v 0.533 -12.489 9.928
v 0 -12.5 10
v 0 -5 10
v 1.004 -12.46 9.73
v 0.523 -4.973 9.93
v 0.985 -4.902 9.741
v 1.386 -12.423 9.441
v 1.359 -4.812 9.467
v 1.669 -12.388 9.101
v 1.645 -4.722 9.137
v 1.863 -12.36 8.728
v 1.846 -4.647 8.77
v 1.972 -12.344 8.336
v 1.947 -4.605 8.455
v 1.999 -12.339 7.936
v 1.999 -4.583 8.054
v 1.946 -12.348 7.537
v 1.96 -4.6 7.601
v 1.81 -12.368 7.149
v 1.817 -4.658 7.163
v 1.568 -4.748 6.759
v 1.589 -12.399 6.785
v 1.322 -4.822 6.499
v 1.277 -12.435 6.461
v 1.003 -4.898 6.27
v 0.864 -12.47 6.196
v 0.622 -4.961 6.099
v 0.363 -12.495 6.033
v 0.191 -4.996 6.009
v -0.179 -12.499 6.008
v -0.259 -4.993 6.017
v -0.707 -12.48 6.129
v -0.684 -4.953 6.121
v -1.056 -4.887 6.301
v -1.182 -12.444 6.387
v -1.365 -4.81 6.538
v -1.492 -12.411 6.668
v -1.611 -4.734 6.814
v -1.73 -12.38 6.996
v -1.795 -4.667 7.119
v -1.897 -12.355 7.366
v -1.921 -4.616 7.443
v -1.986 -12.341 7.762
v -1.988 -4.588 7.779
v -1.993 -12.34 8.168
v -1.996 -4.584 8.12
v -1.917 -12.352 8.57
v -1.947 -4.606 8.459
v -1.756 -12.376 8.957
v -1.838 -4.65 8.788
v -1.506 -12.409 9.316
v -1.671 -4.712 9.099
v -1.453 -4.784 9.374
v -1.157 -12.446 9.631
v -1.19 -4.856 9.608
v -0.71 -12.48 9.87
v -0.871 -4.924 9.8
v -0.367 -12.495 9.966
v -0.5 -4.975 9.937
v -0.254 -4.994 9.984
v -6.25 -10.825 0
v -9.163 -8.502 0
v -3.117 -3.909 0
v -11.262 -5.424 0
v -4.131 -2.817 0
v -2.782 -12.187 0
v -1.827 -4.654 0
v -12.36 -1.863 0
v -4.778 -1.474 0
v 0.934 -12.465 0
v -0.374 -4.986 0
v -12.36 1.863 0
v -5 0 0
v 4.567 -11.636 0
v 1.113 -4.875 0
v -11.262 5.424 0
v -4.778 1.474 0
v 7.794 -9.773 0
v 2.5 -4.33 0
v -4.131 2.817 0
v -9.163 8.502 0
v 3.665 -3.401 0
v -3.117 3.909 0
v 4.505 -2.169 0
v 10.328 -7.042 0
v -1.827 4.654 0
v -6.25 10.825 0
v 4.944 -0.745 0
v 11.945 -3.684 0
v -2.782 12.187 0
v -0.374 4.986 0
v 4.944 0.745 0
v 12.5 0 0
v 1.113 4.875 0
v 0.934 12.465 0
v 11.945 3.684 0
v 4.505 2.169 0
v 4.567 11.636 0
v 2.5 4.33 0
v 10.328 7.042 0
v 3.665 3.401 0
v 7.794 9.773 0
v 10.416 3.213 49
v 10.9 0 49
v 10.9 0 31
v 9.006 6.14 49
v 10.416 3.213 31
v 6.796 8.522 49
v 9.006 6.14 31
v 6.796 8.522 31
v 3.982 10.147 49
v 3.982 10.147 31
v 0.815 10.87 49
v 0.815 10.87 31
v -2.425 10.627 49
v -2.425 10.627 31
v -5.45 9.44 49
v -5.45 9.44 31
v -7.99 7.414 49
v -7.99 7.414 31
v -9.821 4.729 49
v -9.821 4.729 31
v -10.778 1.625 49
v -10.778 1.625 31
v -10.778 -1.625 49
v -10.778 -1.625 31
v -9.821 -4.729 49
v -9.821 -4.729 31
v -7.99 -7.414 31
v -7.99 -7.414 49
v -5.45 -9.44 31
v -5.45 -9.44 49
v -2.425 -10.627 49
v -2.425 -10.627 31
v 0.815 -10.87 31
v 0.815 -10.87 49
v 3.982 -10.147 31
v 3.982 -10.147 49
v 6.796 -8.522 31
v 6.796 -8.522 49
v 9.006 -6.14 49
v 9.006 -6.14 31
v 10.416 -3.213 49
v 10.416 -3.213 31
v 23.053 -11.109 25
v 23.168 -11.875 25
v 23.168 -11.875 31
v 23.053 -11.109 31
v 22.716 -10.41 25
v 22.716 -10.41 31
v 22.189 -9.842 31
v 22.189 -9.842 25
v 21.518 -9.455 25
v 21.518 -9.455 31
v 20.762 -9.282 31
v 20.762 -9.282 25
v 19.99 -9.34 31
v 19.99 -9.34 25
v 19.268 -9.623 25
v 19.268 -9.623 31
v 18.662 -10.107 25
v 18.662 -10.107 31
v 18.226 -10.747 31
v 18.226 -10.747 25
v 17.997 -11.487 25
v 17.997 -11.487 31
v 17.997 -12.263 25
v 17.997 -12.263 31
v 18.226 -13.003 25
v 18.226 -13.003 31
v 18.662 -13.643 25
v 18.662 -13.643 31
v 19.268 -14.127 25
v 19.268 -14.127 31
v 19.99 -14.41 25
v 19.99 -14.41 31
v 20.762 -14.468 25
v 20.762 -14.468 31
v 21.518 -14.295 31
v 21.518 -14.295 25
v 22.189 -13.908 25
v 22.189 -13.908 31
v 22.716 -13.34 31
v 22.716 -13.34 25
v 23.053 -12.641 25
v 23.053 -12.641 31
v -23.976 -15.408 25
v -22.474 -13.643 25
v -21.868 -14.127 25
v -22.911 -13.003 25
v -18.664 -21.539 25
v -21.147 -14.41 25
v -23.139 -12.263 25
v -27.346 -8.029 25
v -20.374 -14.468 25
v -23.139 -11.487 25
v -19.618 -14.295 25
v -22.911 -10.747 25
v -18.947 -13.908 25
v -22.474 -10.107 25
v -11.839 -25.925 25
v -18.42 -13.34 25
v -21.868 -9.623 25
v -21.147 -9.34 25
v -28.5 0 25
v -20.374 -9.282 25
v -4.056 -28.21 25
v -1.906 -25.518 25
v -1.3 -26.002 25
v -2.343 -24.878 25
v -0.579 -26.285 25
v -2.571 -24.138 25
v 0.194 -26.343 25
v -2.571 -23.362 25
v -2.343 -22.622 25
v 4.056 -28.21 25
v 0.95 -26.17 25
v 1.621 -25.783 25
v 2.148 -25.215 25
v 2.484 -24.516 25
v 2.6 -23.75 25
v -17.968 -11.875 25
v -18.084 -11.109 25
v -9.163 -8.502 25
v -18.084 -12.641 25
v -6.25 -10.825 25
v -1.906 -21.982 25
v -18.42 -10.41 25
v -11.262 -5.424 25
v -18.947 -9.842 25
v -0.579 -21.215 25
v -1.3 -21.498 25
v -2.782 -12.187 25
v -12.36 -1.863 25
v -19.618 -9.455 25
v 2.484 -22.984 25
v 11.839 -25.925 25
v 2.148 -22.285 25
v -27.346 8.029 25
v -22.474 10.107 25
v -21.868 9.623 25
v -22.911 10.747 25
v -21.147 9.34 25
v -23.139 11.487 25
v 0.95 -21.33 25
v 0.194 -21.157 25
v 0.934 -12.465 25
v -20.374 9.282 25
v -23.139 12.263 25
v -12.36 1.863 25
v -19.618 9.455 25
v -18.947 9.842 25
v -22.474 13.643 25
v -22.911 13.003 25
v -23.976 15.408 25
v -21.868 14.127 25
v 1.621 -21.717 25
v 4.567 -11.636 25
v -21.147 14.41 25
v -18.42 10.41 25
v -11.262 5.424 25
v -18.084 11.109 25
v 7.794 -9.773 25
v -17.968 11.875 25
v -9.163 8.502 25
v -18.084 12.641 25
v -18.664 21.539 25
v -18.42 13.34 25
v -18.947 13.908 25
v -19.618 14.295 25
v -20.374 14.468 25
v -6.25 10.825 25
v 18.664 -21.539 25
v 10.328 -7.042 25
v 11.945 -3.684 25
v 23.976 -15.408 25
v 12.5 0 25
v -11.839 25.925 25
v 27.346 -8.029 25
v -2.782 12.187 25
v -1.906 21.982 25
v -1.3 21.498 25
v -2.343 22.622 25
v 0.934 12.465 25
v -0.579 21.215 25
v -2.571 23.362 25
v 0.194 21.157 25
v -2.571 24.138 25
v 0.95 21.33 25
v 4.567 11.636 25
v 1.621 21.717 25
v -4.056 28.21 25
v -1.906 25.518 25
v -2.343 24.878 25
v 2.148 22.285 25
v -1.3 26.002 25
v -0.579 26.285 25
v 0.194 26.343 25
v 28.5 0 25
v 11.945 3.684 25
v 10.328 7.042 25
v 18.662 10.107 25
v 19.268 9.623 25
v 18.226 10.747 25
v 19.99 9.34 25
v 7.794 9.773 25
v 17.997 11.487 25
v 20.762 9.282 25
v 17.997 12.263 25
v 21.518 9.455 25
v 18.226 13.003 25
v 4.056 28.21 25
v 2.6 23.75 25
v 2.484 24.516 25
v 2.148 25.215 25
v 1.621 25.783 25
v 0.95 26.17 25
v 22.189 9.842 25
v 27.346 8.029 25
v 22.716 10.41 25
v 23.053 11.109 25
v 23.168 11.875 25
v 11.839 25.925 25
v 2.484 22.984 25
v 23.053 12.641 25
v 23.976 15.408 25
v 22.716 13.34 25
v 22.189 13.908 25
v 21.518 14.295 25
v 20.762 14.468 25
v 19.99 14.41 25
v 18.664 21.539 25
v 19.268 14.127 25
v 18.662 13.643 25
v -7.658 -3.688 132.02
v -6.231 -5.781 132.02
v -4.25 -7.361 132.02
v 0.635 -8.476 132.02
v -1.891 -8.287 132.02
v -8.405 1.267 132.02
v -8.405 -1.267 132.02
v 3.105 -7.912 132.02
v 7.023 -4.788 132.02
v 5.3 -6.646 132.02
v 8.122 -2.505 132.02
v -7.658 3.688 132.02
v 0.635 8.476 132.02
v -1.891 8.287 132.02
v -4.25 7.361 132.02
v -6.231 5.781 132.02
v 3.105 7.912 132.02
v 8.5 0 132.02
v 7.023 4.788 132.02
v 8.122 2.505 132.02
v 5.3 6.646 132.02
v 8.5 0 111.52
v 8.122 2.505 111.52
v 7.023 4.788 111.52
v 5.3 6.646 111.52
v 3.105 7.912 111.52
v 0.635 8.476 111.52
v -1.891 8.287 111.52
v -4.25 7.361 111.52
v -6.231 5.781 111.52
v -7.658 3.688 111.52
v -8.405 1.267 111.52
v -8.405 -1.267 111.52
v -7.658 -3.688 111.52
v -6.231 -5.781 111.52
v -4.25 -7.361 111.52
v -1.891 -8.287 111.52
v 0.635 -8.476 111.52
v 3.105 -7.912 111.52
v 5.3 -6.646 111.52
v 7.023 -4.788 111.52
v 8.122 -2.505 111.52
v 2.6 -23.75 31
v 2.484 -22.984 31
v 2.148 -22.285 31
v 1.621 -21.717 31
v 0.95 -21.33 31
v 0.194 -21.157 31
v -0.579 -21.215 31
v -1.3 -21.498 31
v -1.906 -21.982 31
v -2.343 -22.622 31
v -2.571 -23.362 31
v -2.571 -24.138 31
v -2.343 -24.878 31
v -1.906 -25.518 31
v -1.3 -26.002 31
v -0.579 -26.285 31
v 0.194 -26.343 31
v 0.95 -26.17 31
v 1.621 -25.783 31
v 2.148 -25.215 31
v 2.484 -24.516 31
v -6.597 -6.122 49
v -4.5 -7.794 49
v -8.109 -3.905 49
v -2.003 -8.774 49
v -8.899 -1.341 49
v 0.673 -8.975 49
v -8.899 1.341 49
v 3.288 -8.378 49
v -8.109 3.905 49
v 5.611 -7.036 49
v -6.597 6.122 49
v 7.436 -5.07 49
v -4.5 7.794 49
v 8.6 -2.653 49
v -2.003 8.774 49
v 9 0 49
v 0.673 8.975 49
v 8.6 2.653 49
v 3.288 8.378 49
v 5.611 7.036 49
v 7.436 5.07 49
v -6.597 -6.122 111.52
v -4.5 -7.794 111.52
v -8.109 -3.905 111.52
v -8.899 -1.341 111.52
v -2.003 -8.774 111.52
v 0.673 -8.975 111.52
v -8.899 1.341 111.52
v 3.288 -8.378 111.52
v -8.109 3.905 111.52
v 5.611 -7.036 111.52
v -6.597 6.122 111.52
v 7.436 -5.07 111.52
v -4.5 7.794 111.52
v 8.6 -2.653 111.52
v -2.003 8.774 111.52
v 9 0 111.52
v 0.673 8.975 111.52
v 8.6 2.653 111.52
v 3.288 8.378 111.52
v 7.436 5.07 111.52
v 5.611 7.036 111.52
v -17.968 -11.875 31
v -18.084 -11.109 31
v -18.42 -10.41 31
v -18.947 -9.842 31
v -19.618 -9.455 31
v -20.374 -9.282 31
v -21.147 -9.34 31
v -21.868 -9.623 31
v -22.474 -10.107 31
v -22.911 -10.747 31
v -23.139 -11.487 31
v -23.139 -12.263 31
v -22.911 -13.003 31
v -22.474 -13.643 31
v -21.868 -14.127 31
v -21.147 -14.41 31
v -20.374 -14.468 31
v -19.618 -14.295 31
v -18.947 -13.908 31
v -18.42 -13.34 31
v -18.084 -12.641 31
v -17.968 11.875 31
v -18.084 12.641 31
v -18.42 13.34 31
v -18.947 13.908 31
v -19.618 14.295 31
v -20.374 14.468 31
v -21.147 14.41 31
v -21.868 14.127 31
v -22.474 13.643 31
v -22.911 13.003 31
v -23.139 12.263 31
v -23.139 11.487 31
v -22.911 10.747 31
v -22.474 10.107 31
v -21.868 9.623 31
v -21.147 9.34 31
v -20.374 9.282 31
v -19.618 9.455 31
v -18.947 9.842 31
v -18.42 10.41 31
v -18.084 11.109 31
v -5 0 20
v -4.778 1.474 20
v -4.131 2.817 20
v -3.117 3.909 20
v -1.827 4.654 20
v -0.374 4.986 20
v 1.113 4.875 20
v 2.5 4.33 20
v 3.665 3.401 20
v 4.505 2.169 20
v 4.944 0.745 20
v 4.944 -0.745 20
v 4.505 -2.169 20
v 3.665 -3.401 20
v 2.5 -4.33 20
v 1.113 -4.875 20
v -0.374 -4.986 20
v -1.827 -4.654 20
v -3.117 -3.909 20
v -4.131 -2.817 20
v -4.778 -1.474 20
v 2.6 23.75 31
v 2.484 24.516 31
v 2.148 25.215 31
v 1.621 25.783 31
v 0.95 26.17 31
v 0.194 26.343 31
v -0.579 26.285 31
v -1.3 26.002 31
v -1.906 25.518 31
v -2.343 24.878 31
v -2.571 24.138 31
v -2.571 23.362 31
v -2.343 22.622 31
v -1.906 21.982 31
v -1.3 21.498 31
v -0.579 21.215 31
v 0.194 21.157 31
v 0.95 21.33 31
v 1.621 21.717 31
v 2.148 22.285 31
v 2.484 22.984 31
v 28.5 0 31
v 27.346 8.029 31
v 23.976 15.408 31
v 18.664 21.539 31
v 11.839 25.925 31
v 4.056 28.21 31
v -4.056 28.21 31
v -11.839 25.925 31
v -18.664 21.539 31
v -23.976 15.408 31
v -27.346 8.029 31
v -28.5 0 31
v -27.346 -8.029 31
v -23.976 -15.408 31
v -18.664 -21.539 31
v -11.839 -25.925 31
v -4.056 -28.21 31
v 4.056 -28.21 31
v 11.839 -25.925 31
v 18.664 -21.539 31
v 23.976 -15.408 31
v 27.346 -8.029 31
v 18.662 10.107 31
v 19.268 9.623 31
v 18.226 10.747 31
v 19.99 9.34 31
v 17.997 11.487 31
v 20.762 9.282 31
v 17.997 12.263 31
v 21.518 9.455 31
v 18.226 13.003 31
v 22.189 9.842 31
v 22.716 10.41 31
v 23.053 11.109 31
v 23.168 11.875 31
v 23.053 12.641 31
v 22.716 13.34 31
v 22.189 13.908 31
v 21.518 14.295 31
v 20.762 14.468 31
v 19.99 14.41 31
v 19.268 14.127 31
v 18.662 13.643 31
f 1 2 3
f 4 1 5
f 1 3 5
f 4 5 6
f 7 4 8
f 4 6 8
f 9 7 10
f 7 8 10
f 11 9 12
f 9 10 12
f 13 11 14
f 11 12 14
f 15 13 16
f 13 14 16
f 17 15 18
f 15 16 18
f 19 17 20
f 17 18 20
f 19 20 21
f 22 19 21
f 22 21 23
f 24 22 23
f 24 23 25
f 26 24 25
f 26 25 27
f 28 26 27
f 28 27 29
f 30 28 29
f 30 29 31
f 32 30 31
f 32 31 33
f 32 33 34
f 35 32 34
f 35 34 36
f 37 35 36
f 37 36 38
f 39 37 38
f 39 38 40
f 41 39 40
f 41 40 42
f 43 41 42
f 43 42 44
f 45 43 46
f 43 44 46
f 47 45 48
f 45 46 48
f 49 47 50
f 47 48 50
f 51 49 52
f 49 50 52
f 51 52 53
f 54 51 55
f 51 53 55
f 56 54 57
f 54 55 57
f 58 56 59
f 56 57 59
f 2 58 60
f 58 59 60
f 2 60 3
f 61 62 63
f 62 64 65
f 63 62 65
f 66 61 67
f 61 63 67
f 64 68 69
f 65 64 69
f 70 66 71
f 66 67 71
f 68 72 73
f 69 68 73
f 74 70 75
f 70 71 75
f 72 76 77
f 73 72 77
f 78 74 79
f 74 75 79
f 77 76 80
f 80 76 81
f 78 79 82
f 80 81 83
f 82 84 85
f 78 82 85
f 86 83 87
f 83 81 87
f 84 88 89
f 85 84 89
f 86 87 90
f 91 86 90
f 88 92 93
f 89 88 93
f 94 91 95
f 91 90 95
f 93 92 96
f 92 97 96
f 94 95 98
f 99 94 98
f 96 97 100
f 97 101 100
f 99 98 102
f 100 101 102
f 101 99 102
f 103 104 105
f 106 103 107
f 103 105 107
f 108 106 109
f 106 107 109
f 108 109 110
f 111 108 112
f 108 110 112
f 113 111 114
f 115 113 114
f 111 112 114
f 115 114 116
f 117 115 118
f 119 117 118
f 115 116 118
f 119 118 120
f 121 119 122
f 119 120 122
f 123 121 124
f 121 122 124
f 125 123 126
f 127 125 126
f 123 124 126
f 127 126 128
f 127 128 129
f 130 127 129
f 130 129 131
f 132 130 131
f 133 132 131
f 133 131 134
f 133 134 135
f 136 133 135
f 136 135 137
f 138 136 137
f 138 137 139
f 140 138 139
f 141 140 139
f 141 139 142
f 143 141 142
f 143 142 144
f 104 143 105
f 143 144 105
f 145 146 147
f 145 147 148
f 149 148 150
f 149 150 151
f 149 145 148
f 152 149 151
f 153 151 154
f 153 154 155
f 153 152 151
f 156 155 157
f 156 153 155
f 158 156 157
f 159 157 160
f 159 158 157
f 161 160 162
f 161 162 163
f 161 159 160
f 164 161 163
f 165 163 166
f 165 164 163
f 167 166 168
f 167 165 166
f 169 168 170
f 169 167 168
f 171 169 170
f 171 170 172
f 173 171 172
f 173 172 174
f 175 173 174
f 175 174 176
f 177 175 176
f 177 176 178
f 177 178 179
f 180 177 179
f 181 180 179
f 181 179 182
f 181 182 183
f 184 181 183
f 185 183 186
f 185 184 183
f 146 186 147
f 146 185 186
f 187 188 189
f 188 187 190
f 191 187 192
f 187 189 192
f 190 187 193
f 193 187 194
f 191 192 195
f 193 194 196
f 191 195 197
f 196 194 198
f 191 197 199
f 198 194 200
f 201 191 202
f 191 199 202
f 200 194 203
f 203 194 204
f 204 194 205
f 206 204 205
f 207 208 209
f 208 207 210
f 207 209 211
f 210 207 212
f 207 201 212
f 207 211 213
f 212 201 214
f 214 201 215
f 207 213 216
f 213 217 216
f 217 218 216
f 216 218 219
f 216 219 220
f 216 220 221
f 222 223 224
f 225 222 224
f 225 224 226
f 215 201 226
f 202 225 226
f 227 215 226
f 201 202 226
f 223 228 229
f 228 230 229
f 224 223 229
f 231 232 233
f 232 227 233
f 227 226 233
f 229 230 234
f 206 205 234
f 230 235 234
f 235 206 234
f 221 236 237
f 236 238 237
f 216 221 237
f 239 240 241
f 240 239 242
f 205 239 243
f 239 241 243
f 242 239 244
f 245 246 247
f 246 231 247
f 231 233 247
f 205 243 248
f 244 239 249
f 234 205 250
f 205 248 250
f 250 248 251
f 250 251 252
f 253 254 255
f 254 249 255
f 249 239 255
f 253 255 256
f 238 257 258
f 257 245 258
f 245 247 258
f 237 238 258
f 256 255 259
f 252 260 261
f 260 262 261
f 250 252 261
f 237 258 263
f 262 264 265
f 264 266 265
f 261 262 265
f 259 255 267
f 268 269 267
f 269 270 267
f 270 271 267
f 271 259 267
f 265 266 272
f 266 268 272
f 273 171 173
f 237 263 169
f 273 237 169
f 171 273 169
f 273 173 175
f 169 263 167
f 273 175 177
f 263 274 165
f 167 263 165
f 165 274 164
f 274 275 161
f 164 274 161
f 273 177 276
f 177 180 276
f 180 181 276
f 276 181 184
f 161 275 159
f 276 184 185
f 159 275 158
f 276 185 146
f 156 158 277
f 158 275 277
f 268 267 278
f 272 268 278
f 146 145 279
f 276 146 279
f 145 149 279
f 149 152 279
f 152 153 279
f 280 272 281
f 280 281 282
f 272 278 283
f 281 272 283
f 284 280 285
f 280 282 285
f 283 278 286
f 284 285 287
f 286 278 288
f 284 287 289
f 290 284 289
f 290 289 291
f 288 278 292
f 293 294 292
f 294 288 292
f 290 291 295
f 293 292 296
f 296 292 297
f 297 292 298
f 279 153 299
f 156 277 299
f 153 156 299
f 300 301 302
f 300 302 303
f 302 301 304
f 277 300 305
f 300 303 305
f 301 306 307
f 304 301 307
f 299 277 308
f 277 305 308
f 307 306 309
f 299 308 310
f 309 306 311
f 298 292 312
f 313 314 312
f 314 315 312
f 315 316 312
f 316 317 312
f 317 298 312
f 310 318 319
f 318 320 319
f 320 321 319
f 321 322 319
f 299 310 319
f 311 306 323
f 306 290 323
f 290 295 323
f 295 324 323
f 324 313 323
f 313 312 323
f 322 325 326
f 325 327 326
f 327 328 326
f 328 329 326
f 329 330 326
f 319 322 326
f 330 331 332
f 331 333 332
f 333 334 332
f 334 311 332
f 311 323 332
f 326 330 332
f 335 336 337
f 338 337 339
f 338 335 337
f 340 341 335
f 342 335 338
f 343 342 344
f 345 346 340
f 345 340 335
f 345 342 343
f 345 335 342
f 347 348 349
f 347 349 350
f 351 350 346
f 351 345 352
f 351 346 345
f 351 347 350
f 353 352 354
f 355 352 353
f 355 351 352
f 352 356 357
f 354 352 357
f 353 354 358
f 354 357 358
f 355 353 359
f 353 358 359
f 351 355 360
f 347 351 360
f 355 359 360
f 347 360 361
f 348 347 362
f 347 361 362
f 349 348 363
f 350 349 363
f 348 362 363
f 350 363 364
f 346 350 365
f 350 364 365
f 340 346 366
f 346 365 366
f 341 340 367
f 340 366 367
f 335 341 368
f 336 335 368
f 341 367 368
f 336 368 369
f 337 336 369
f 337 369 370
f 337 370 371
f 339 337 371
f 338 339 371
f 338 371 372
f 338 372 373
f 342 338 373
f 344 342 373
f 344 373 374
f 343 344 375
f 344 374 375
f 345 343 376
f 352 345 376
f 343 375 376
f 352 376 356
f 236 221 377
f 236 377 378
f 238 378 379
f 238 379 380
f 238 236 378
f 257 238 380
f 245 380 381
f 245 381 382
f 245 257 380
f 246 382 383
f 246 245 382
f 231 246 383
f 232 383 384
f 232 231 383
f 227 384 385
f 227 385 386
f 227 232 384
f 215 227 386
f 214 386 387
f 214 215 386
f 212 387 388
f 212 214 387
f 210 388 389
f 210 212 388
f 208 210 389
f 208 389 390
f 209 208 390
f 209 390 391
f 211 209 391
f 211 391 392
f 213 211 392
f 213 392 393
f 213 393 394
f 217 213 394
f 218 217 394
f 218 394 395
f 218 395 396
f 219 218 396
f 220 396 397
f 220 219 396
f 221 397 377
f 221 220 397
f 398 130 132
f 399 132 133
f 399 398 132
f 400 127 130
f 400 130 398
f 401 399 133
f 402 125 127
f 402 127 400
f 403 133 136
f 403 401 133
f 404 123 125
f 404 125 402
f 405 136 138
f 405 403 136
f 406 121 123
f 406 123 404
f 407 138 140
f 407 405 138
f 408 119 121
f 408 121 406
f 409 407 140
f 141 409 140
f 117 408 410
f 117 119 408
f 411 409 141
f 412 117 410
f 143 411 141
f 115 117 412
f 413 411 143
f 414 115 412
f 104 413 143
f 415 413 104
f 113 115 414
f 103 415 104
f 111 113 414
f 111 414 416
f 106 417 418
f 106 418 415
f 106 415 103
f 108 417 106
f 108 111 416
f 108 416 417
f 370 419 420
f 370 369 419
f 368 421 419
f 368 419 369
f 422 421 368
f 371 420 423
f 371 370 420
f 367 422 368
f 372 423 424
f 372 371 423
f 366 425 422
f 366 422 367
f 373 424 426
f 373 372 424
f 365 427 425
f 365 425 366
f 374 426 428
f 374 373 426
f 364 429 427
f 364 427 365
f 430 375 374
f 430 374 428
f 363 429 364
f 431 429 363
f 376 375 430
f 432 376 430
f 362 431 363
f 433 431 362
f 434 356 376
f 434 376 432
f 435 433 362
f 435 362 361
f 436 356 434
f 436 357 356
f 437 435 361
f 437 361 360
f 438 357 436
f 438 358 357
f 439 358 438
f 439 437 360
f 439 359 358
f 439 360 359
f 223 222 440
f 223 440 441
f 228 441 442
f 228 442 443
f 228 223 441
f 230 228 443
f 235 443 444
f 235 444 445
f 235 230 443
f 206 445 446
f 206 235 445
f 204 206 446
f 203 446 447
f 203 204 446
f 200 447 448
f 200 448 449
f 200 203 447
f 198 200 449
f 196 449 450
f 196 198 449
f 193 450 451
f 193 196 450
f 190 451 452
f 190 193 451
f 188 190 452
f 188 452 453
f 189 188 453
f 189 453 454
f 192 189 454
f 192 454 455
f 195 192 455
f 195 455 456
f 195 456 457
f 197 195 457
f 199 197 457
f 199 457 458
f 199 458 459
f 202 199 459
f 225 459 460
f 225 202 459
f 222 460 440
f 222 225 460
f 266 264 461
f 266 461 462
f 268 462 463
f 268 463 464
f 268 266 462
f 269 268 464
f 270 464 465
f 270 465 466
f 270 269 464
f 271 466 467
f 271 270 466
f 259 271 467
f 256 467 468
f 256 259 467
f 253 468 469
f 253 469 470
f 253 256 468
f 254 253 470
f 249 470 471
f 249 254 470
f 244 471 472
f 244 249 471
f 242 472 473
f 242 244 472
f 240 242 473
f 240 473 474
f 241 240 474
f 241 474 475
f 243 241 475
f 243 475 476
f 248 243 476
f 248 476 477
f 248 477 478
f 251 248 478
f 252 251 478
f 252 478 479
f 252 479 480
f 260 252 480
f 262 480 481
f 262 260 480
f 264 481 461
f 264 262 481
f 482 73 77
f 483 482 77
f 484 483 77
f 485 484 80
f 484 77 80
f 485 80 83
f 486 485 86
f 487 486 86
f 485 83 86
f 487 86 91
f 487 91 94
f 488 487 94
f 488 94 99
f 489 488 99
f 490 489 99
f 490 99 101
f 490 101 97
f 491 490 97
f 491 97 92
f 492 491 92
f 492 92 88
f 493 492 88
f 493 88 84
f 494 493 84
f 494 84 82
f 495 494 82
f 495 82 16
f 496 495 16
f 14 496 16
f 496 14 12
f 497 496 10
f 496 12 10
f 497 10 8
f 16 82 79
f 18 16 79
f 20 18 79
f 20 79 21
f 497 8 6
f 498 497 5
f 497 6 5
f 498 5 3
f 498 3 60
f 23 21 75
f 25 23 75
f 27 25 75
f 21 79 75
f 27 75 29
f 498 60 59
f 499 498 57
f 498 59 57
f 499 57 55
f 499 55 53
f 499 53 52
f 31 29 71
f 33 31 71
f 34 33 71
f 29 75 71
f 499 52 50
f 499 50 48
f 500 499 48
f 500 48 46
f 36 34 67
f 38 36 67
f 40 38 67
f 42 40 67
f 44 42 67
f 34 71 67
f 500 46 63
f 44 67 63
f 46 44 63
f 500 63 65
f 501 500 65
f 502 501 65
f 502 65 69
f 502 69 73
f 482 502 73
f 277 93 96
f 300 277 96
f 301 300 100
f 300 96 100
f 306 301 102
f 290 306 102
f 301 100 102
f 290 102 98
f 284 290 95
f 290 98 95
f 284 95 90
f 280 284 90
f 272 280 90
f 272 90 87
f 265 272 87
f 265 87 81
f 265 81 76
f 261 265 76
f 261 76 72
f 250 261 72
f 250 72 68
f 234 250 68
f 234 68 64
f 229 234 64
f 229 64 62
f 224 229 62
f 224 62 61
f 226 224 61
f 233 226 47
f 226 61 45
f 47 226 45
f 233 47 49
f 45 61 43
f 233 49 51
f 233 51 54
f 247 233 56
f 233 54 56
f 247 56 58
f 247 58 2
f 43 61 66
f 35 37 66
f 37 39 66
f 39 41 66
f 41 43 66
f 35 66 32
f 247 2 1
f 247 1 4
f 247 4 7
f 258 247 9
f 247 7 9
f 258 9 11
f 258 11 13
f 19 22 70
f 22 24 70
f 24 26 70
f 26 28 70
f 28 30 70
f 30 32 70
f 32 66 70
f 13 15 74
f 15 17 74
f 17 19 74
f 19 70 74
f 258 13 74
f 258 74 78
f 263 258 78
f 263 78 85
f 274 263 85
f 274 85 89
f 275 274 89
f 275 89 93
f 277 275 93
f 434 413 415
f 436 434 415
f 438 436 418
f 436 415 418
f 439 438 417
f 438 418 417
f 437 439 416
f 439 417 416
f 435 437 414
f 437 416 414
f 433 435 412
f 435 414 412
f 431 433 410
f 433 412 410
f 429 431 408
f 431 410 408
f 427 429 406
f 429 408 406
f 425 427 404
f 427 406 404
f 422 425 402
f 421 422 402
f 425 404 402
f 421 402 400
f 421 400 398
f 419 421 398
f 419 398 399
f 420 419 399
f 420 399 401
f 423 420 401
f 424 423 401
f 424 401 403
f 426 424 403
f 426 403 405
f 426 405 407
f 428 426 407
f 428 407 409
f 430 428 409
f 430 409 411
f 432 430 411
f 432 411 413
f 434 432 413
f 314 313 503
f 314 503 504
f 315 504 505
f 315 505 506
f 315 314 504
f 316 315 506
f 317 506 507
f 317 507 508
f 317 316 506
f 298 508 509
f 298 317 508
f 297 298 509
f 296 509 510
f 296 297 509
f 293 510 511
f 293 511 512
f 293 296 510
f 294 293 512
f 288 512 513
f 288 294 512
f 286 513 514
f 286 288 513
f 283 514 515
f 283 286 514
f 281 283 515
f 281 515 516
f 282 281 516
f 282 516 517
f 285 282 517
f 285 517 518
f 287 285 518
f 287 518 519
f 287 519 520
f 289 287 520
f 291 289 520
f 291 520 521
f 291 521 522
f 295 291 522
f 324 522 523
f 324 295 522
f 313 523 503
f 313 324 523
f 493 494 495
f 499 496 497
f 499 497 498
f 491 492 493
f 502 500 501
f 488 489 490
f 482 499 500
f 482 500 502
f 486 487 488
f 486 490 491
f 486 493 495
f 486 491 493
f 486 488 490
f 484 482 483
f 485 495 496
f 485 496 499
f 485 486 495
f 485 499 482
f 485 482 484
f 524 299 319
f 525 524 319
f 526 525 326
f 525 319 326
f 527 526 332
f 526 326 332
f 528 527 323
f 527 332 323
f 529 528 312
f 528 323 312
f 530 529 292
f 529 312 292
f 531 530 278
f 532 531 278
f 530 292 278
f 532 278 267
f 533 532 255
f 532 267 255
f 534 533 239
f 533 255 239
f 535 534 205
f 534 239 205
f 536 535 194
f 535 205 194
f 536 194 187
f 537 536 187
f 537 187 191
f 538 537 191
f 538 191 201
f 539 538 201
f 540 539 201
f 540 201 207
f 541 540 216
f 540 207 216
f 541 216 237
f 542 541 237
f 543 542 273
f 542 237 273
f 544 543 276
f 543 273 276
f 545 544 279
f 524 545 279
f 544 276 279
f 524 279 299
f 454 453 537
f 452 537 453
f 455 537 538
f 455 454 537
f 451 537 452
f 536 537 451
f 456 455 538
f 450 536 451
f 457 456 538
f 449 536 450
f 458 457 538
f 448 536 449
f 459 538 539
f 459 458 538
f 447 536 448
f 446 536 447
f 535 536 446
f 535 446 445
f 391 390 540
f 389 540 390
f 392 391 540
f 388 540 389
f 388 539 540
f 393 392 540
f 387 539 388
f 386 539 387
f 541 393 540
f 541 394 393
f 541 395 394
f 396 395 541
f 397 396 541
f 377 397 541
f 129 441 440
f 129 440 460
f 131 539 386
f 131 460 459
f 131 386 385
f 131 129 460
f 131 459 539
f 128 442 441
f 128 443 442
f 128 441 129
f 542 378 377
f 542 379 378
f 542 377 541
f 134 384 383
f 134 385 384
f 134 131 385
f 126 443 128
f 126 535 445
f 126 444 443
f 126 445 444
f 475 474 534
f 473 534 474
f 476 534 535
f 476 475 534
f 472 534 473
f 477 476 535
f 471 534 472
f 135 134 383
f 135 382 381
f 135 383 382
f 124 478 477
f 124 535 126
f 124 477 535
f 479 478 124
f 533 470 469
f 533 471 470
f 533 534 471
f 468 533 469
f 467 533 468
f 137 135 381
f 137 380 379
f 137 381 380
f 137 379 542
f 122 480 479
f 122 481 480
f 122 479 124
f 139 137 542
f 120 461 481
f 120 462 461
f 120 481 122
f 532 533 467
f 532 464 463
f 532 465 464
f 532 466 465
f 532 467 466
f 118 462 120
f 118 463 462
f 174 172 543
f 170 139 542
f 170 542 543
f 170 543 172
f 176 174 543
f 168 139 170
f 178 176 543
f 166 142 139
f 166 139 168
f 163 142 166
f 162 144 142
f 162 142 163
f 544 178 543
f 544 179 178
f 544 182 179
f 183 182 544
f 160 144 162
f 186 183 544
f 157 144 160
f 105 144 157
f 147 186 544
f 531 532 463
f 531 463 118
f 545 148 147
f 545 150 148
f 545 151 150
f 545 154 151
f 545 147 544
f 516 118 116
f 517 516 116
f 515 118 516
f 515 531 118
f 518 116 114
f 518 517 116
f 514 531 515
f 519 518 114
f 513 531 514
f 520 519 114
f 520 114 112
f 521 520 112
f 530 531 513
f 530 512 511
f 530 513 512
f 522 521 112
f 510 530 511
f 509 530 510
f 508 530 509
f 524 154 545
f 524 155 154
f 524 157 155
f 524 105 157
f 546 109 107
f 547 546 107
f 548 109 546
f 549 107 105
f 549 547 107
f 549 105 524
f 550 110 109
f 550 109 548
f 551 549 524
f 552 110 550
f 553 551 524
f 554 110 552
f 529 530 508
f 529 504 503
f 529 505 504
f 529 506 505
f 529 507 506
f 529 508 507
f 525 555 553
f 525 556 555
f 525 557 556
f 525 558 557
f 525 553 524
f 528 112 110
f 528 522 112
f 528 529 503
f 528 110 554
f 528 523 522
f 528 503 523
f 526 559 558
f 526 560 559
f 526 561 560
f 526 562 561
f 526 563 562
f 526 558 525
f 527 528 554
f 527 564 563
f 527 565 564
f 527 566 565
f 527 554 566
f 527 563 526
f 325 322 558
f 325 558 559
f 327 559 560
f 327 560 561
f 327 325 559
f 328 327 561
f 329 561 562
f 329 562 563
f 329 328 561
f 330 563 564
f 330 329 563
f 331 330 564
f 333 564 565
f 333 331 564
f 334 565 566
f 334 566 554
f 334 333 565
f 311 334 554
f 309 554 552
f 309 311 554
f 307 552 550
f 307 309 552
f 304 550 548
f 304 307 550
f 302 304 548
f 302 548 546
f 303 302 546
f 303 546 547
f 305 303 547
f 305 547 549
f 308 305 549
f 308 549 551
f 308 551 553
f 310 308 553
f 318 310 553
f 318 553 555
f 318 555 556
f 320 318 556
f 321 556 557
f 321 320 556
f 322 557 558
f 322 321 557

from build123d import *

# Parameters (mm, degrees)
SKETCH1_R           = 12.5
BOSS_EXTRUDE1_DEPTH = 25
SKETCH2_R           = 5
CUT_EXTRUDE1_DEPTH  = 20
SKETCH4_R           = 2
CUT_EXTRUDE2_DEPTH  = 20
SKETCH5_R           = 28.5
SKETCH5_R_2         = 2.6
BOSS_EXTRUDE2_DEPTH = 6
SKETCH6_R           = 9
BOSS_EXTRUDE3_DEPTH = 80.52
SKETCH7_R           = 8.5
BOSS_EXTRUDE4_DEPTH = 20.5
SKETCH8_R           = 10.9
BOSS_EXTRUDE5_DEPTH = 18


with BuildPart() as part:
    # Sketch1 → Boss-Extrude1 (new body)
    with BuildSketch(Plane.XY):
        Circle(SKETCH1_R)
    extrude(amount=BOSS_EXTRUDE1_DEPTH)

    # Sketch2 → Cut-Extrude1 (cut)
    with BuildSketch(Plane(origin=(0, 0, 0), x_dir=(-1, 0, 0), z_dir=(0, 0, -1))):
        Circle(SKETCH2_R)
    extrude(amount=-CUT_EXTRUDE1_DEPTH, mode=Mode.SUBTRACT)

    # Sketch4 → Cut-Extrude2 (cut)
    with BuildSketch(Plane(origin=(0, 0, 0), x_dir=(1, 0, 0), z_dir=(0, 1, 0))):
        with Locations(Location((0, -8, 0), (0, 0, 270))):
            Circle(SKETCH4_R)
    extrude(amount=-CUT_EXTRUDE2_DEPTH, mode=Mode.SUBTRACT)

    # Sketch5 → Boss-Extrude2 (add)
    with BuildSketch(Plane.XY.offset(25)):
        Circle(SKETCH5_R)
        with Locations((0, 23.75)):
            Circle(SKETCH5_R_2, mode=Mode.SUBTRACT)
        with Locations((20.56810334, 11.875)):
            Circle(SKETCH5_R_2, mode=Mode.SUBTRACT)
        with Locations((20.56810334, -11.875)):
            Circle(SKETCH5_R_2, mode=Mode.SUBTRACT)
        with Locations((0, -23.75)):
            Circle(SKETCH5_R_2, mode=Mode.SUBTRACT)
        with Locations((-20.56810334, -11.875)):
            Circle(SKETCH5_R_2, mode=Mode.SUBTRACT)
        with Locations((-20.56810334, 11.875)):
            Circle(SKETCH5_R_2, mode=Mode.SUBTRACT)
    extrude(amount=BOSS_EXTRUDE2_DEPTH)

    # Sketch6 → Boss-Extrude3 (add)
    with BuildSketch(Plane.XY.offset(31)):
        Circle(SKETCH6_R)
    extrude(amount=BOSS_EXTRUDE3_DEPTH)

    # Sketch7 → Boss-Extrude4 (add)
    with BuildSketch(Plane.XY.offset(111.52)):
        Circle(SKETCH7_R)
    extrude(amount=BOSS_EXTRUDE4_DEPTH)

    # Sketch8 → Boss-Extrude5 (add)
    with BuildSketch(Plane.XY.offset(31)):
        Circle(SKETCH8_R)
    extrude(amount=BOSS_EXTRUDE5_DEPTH)


solid = part.part
